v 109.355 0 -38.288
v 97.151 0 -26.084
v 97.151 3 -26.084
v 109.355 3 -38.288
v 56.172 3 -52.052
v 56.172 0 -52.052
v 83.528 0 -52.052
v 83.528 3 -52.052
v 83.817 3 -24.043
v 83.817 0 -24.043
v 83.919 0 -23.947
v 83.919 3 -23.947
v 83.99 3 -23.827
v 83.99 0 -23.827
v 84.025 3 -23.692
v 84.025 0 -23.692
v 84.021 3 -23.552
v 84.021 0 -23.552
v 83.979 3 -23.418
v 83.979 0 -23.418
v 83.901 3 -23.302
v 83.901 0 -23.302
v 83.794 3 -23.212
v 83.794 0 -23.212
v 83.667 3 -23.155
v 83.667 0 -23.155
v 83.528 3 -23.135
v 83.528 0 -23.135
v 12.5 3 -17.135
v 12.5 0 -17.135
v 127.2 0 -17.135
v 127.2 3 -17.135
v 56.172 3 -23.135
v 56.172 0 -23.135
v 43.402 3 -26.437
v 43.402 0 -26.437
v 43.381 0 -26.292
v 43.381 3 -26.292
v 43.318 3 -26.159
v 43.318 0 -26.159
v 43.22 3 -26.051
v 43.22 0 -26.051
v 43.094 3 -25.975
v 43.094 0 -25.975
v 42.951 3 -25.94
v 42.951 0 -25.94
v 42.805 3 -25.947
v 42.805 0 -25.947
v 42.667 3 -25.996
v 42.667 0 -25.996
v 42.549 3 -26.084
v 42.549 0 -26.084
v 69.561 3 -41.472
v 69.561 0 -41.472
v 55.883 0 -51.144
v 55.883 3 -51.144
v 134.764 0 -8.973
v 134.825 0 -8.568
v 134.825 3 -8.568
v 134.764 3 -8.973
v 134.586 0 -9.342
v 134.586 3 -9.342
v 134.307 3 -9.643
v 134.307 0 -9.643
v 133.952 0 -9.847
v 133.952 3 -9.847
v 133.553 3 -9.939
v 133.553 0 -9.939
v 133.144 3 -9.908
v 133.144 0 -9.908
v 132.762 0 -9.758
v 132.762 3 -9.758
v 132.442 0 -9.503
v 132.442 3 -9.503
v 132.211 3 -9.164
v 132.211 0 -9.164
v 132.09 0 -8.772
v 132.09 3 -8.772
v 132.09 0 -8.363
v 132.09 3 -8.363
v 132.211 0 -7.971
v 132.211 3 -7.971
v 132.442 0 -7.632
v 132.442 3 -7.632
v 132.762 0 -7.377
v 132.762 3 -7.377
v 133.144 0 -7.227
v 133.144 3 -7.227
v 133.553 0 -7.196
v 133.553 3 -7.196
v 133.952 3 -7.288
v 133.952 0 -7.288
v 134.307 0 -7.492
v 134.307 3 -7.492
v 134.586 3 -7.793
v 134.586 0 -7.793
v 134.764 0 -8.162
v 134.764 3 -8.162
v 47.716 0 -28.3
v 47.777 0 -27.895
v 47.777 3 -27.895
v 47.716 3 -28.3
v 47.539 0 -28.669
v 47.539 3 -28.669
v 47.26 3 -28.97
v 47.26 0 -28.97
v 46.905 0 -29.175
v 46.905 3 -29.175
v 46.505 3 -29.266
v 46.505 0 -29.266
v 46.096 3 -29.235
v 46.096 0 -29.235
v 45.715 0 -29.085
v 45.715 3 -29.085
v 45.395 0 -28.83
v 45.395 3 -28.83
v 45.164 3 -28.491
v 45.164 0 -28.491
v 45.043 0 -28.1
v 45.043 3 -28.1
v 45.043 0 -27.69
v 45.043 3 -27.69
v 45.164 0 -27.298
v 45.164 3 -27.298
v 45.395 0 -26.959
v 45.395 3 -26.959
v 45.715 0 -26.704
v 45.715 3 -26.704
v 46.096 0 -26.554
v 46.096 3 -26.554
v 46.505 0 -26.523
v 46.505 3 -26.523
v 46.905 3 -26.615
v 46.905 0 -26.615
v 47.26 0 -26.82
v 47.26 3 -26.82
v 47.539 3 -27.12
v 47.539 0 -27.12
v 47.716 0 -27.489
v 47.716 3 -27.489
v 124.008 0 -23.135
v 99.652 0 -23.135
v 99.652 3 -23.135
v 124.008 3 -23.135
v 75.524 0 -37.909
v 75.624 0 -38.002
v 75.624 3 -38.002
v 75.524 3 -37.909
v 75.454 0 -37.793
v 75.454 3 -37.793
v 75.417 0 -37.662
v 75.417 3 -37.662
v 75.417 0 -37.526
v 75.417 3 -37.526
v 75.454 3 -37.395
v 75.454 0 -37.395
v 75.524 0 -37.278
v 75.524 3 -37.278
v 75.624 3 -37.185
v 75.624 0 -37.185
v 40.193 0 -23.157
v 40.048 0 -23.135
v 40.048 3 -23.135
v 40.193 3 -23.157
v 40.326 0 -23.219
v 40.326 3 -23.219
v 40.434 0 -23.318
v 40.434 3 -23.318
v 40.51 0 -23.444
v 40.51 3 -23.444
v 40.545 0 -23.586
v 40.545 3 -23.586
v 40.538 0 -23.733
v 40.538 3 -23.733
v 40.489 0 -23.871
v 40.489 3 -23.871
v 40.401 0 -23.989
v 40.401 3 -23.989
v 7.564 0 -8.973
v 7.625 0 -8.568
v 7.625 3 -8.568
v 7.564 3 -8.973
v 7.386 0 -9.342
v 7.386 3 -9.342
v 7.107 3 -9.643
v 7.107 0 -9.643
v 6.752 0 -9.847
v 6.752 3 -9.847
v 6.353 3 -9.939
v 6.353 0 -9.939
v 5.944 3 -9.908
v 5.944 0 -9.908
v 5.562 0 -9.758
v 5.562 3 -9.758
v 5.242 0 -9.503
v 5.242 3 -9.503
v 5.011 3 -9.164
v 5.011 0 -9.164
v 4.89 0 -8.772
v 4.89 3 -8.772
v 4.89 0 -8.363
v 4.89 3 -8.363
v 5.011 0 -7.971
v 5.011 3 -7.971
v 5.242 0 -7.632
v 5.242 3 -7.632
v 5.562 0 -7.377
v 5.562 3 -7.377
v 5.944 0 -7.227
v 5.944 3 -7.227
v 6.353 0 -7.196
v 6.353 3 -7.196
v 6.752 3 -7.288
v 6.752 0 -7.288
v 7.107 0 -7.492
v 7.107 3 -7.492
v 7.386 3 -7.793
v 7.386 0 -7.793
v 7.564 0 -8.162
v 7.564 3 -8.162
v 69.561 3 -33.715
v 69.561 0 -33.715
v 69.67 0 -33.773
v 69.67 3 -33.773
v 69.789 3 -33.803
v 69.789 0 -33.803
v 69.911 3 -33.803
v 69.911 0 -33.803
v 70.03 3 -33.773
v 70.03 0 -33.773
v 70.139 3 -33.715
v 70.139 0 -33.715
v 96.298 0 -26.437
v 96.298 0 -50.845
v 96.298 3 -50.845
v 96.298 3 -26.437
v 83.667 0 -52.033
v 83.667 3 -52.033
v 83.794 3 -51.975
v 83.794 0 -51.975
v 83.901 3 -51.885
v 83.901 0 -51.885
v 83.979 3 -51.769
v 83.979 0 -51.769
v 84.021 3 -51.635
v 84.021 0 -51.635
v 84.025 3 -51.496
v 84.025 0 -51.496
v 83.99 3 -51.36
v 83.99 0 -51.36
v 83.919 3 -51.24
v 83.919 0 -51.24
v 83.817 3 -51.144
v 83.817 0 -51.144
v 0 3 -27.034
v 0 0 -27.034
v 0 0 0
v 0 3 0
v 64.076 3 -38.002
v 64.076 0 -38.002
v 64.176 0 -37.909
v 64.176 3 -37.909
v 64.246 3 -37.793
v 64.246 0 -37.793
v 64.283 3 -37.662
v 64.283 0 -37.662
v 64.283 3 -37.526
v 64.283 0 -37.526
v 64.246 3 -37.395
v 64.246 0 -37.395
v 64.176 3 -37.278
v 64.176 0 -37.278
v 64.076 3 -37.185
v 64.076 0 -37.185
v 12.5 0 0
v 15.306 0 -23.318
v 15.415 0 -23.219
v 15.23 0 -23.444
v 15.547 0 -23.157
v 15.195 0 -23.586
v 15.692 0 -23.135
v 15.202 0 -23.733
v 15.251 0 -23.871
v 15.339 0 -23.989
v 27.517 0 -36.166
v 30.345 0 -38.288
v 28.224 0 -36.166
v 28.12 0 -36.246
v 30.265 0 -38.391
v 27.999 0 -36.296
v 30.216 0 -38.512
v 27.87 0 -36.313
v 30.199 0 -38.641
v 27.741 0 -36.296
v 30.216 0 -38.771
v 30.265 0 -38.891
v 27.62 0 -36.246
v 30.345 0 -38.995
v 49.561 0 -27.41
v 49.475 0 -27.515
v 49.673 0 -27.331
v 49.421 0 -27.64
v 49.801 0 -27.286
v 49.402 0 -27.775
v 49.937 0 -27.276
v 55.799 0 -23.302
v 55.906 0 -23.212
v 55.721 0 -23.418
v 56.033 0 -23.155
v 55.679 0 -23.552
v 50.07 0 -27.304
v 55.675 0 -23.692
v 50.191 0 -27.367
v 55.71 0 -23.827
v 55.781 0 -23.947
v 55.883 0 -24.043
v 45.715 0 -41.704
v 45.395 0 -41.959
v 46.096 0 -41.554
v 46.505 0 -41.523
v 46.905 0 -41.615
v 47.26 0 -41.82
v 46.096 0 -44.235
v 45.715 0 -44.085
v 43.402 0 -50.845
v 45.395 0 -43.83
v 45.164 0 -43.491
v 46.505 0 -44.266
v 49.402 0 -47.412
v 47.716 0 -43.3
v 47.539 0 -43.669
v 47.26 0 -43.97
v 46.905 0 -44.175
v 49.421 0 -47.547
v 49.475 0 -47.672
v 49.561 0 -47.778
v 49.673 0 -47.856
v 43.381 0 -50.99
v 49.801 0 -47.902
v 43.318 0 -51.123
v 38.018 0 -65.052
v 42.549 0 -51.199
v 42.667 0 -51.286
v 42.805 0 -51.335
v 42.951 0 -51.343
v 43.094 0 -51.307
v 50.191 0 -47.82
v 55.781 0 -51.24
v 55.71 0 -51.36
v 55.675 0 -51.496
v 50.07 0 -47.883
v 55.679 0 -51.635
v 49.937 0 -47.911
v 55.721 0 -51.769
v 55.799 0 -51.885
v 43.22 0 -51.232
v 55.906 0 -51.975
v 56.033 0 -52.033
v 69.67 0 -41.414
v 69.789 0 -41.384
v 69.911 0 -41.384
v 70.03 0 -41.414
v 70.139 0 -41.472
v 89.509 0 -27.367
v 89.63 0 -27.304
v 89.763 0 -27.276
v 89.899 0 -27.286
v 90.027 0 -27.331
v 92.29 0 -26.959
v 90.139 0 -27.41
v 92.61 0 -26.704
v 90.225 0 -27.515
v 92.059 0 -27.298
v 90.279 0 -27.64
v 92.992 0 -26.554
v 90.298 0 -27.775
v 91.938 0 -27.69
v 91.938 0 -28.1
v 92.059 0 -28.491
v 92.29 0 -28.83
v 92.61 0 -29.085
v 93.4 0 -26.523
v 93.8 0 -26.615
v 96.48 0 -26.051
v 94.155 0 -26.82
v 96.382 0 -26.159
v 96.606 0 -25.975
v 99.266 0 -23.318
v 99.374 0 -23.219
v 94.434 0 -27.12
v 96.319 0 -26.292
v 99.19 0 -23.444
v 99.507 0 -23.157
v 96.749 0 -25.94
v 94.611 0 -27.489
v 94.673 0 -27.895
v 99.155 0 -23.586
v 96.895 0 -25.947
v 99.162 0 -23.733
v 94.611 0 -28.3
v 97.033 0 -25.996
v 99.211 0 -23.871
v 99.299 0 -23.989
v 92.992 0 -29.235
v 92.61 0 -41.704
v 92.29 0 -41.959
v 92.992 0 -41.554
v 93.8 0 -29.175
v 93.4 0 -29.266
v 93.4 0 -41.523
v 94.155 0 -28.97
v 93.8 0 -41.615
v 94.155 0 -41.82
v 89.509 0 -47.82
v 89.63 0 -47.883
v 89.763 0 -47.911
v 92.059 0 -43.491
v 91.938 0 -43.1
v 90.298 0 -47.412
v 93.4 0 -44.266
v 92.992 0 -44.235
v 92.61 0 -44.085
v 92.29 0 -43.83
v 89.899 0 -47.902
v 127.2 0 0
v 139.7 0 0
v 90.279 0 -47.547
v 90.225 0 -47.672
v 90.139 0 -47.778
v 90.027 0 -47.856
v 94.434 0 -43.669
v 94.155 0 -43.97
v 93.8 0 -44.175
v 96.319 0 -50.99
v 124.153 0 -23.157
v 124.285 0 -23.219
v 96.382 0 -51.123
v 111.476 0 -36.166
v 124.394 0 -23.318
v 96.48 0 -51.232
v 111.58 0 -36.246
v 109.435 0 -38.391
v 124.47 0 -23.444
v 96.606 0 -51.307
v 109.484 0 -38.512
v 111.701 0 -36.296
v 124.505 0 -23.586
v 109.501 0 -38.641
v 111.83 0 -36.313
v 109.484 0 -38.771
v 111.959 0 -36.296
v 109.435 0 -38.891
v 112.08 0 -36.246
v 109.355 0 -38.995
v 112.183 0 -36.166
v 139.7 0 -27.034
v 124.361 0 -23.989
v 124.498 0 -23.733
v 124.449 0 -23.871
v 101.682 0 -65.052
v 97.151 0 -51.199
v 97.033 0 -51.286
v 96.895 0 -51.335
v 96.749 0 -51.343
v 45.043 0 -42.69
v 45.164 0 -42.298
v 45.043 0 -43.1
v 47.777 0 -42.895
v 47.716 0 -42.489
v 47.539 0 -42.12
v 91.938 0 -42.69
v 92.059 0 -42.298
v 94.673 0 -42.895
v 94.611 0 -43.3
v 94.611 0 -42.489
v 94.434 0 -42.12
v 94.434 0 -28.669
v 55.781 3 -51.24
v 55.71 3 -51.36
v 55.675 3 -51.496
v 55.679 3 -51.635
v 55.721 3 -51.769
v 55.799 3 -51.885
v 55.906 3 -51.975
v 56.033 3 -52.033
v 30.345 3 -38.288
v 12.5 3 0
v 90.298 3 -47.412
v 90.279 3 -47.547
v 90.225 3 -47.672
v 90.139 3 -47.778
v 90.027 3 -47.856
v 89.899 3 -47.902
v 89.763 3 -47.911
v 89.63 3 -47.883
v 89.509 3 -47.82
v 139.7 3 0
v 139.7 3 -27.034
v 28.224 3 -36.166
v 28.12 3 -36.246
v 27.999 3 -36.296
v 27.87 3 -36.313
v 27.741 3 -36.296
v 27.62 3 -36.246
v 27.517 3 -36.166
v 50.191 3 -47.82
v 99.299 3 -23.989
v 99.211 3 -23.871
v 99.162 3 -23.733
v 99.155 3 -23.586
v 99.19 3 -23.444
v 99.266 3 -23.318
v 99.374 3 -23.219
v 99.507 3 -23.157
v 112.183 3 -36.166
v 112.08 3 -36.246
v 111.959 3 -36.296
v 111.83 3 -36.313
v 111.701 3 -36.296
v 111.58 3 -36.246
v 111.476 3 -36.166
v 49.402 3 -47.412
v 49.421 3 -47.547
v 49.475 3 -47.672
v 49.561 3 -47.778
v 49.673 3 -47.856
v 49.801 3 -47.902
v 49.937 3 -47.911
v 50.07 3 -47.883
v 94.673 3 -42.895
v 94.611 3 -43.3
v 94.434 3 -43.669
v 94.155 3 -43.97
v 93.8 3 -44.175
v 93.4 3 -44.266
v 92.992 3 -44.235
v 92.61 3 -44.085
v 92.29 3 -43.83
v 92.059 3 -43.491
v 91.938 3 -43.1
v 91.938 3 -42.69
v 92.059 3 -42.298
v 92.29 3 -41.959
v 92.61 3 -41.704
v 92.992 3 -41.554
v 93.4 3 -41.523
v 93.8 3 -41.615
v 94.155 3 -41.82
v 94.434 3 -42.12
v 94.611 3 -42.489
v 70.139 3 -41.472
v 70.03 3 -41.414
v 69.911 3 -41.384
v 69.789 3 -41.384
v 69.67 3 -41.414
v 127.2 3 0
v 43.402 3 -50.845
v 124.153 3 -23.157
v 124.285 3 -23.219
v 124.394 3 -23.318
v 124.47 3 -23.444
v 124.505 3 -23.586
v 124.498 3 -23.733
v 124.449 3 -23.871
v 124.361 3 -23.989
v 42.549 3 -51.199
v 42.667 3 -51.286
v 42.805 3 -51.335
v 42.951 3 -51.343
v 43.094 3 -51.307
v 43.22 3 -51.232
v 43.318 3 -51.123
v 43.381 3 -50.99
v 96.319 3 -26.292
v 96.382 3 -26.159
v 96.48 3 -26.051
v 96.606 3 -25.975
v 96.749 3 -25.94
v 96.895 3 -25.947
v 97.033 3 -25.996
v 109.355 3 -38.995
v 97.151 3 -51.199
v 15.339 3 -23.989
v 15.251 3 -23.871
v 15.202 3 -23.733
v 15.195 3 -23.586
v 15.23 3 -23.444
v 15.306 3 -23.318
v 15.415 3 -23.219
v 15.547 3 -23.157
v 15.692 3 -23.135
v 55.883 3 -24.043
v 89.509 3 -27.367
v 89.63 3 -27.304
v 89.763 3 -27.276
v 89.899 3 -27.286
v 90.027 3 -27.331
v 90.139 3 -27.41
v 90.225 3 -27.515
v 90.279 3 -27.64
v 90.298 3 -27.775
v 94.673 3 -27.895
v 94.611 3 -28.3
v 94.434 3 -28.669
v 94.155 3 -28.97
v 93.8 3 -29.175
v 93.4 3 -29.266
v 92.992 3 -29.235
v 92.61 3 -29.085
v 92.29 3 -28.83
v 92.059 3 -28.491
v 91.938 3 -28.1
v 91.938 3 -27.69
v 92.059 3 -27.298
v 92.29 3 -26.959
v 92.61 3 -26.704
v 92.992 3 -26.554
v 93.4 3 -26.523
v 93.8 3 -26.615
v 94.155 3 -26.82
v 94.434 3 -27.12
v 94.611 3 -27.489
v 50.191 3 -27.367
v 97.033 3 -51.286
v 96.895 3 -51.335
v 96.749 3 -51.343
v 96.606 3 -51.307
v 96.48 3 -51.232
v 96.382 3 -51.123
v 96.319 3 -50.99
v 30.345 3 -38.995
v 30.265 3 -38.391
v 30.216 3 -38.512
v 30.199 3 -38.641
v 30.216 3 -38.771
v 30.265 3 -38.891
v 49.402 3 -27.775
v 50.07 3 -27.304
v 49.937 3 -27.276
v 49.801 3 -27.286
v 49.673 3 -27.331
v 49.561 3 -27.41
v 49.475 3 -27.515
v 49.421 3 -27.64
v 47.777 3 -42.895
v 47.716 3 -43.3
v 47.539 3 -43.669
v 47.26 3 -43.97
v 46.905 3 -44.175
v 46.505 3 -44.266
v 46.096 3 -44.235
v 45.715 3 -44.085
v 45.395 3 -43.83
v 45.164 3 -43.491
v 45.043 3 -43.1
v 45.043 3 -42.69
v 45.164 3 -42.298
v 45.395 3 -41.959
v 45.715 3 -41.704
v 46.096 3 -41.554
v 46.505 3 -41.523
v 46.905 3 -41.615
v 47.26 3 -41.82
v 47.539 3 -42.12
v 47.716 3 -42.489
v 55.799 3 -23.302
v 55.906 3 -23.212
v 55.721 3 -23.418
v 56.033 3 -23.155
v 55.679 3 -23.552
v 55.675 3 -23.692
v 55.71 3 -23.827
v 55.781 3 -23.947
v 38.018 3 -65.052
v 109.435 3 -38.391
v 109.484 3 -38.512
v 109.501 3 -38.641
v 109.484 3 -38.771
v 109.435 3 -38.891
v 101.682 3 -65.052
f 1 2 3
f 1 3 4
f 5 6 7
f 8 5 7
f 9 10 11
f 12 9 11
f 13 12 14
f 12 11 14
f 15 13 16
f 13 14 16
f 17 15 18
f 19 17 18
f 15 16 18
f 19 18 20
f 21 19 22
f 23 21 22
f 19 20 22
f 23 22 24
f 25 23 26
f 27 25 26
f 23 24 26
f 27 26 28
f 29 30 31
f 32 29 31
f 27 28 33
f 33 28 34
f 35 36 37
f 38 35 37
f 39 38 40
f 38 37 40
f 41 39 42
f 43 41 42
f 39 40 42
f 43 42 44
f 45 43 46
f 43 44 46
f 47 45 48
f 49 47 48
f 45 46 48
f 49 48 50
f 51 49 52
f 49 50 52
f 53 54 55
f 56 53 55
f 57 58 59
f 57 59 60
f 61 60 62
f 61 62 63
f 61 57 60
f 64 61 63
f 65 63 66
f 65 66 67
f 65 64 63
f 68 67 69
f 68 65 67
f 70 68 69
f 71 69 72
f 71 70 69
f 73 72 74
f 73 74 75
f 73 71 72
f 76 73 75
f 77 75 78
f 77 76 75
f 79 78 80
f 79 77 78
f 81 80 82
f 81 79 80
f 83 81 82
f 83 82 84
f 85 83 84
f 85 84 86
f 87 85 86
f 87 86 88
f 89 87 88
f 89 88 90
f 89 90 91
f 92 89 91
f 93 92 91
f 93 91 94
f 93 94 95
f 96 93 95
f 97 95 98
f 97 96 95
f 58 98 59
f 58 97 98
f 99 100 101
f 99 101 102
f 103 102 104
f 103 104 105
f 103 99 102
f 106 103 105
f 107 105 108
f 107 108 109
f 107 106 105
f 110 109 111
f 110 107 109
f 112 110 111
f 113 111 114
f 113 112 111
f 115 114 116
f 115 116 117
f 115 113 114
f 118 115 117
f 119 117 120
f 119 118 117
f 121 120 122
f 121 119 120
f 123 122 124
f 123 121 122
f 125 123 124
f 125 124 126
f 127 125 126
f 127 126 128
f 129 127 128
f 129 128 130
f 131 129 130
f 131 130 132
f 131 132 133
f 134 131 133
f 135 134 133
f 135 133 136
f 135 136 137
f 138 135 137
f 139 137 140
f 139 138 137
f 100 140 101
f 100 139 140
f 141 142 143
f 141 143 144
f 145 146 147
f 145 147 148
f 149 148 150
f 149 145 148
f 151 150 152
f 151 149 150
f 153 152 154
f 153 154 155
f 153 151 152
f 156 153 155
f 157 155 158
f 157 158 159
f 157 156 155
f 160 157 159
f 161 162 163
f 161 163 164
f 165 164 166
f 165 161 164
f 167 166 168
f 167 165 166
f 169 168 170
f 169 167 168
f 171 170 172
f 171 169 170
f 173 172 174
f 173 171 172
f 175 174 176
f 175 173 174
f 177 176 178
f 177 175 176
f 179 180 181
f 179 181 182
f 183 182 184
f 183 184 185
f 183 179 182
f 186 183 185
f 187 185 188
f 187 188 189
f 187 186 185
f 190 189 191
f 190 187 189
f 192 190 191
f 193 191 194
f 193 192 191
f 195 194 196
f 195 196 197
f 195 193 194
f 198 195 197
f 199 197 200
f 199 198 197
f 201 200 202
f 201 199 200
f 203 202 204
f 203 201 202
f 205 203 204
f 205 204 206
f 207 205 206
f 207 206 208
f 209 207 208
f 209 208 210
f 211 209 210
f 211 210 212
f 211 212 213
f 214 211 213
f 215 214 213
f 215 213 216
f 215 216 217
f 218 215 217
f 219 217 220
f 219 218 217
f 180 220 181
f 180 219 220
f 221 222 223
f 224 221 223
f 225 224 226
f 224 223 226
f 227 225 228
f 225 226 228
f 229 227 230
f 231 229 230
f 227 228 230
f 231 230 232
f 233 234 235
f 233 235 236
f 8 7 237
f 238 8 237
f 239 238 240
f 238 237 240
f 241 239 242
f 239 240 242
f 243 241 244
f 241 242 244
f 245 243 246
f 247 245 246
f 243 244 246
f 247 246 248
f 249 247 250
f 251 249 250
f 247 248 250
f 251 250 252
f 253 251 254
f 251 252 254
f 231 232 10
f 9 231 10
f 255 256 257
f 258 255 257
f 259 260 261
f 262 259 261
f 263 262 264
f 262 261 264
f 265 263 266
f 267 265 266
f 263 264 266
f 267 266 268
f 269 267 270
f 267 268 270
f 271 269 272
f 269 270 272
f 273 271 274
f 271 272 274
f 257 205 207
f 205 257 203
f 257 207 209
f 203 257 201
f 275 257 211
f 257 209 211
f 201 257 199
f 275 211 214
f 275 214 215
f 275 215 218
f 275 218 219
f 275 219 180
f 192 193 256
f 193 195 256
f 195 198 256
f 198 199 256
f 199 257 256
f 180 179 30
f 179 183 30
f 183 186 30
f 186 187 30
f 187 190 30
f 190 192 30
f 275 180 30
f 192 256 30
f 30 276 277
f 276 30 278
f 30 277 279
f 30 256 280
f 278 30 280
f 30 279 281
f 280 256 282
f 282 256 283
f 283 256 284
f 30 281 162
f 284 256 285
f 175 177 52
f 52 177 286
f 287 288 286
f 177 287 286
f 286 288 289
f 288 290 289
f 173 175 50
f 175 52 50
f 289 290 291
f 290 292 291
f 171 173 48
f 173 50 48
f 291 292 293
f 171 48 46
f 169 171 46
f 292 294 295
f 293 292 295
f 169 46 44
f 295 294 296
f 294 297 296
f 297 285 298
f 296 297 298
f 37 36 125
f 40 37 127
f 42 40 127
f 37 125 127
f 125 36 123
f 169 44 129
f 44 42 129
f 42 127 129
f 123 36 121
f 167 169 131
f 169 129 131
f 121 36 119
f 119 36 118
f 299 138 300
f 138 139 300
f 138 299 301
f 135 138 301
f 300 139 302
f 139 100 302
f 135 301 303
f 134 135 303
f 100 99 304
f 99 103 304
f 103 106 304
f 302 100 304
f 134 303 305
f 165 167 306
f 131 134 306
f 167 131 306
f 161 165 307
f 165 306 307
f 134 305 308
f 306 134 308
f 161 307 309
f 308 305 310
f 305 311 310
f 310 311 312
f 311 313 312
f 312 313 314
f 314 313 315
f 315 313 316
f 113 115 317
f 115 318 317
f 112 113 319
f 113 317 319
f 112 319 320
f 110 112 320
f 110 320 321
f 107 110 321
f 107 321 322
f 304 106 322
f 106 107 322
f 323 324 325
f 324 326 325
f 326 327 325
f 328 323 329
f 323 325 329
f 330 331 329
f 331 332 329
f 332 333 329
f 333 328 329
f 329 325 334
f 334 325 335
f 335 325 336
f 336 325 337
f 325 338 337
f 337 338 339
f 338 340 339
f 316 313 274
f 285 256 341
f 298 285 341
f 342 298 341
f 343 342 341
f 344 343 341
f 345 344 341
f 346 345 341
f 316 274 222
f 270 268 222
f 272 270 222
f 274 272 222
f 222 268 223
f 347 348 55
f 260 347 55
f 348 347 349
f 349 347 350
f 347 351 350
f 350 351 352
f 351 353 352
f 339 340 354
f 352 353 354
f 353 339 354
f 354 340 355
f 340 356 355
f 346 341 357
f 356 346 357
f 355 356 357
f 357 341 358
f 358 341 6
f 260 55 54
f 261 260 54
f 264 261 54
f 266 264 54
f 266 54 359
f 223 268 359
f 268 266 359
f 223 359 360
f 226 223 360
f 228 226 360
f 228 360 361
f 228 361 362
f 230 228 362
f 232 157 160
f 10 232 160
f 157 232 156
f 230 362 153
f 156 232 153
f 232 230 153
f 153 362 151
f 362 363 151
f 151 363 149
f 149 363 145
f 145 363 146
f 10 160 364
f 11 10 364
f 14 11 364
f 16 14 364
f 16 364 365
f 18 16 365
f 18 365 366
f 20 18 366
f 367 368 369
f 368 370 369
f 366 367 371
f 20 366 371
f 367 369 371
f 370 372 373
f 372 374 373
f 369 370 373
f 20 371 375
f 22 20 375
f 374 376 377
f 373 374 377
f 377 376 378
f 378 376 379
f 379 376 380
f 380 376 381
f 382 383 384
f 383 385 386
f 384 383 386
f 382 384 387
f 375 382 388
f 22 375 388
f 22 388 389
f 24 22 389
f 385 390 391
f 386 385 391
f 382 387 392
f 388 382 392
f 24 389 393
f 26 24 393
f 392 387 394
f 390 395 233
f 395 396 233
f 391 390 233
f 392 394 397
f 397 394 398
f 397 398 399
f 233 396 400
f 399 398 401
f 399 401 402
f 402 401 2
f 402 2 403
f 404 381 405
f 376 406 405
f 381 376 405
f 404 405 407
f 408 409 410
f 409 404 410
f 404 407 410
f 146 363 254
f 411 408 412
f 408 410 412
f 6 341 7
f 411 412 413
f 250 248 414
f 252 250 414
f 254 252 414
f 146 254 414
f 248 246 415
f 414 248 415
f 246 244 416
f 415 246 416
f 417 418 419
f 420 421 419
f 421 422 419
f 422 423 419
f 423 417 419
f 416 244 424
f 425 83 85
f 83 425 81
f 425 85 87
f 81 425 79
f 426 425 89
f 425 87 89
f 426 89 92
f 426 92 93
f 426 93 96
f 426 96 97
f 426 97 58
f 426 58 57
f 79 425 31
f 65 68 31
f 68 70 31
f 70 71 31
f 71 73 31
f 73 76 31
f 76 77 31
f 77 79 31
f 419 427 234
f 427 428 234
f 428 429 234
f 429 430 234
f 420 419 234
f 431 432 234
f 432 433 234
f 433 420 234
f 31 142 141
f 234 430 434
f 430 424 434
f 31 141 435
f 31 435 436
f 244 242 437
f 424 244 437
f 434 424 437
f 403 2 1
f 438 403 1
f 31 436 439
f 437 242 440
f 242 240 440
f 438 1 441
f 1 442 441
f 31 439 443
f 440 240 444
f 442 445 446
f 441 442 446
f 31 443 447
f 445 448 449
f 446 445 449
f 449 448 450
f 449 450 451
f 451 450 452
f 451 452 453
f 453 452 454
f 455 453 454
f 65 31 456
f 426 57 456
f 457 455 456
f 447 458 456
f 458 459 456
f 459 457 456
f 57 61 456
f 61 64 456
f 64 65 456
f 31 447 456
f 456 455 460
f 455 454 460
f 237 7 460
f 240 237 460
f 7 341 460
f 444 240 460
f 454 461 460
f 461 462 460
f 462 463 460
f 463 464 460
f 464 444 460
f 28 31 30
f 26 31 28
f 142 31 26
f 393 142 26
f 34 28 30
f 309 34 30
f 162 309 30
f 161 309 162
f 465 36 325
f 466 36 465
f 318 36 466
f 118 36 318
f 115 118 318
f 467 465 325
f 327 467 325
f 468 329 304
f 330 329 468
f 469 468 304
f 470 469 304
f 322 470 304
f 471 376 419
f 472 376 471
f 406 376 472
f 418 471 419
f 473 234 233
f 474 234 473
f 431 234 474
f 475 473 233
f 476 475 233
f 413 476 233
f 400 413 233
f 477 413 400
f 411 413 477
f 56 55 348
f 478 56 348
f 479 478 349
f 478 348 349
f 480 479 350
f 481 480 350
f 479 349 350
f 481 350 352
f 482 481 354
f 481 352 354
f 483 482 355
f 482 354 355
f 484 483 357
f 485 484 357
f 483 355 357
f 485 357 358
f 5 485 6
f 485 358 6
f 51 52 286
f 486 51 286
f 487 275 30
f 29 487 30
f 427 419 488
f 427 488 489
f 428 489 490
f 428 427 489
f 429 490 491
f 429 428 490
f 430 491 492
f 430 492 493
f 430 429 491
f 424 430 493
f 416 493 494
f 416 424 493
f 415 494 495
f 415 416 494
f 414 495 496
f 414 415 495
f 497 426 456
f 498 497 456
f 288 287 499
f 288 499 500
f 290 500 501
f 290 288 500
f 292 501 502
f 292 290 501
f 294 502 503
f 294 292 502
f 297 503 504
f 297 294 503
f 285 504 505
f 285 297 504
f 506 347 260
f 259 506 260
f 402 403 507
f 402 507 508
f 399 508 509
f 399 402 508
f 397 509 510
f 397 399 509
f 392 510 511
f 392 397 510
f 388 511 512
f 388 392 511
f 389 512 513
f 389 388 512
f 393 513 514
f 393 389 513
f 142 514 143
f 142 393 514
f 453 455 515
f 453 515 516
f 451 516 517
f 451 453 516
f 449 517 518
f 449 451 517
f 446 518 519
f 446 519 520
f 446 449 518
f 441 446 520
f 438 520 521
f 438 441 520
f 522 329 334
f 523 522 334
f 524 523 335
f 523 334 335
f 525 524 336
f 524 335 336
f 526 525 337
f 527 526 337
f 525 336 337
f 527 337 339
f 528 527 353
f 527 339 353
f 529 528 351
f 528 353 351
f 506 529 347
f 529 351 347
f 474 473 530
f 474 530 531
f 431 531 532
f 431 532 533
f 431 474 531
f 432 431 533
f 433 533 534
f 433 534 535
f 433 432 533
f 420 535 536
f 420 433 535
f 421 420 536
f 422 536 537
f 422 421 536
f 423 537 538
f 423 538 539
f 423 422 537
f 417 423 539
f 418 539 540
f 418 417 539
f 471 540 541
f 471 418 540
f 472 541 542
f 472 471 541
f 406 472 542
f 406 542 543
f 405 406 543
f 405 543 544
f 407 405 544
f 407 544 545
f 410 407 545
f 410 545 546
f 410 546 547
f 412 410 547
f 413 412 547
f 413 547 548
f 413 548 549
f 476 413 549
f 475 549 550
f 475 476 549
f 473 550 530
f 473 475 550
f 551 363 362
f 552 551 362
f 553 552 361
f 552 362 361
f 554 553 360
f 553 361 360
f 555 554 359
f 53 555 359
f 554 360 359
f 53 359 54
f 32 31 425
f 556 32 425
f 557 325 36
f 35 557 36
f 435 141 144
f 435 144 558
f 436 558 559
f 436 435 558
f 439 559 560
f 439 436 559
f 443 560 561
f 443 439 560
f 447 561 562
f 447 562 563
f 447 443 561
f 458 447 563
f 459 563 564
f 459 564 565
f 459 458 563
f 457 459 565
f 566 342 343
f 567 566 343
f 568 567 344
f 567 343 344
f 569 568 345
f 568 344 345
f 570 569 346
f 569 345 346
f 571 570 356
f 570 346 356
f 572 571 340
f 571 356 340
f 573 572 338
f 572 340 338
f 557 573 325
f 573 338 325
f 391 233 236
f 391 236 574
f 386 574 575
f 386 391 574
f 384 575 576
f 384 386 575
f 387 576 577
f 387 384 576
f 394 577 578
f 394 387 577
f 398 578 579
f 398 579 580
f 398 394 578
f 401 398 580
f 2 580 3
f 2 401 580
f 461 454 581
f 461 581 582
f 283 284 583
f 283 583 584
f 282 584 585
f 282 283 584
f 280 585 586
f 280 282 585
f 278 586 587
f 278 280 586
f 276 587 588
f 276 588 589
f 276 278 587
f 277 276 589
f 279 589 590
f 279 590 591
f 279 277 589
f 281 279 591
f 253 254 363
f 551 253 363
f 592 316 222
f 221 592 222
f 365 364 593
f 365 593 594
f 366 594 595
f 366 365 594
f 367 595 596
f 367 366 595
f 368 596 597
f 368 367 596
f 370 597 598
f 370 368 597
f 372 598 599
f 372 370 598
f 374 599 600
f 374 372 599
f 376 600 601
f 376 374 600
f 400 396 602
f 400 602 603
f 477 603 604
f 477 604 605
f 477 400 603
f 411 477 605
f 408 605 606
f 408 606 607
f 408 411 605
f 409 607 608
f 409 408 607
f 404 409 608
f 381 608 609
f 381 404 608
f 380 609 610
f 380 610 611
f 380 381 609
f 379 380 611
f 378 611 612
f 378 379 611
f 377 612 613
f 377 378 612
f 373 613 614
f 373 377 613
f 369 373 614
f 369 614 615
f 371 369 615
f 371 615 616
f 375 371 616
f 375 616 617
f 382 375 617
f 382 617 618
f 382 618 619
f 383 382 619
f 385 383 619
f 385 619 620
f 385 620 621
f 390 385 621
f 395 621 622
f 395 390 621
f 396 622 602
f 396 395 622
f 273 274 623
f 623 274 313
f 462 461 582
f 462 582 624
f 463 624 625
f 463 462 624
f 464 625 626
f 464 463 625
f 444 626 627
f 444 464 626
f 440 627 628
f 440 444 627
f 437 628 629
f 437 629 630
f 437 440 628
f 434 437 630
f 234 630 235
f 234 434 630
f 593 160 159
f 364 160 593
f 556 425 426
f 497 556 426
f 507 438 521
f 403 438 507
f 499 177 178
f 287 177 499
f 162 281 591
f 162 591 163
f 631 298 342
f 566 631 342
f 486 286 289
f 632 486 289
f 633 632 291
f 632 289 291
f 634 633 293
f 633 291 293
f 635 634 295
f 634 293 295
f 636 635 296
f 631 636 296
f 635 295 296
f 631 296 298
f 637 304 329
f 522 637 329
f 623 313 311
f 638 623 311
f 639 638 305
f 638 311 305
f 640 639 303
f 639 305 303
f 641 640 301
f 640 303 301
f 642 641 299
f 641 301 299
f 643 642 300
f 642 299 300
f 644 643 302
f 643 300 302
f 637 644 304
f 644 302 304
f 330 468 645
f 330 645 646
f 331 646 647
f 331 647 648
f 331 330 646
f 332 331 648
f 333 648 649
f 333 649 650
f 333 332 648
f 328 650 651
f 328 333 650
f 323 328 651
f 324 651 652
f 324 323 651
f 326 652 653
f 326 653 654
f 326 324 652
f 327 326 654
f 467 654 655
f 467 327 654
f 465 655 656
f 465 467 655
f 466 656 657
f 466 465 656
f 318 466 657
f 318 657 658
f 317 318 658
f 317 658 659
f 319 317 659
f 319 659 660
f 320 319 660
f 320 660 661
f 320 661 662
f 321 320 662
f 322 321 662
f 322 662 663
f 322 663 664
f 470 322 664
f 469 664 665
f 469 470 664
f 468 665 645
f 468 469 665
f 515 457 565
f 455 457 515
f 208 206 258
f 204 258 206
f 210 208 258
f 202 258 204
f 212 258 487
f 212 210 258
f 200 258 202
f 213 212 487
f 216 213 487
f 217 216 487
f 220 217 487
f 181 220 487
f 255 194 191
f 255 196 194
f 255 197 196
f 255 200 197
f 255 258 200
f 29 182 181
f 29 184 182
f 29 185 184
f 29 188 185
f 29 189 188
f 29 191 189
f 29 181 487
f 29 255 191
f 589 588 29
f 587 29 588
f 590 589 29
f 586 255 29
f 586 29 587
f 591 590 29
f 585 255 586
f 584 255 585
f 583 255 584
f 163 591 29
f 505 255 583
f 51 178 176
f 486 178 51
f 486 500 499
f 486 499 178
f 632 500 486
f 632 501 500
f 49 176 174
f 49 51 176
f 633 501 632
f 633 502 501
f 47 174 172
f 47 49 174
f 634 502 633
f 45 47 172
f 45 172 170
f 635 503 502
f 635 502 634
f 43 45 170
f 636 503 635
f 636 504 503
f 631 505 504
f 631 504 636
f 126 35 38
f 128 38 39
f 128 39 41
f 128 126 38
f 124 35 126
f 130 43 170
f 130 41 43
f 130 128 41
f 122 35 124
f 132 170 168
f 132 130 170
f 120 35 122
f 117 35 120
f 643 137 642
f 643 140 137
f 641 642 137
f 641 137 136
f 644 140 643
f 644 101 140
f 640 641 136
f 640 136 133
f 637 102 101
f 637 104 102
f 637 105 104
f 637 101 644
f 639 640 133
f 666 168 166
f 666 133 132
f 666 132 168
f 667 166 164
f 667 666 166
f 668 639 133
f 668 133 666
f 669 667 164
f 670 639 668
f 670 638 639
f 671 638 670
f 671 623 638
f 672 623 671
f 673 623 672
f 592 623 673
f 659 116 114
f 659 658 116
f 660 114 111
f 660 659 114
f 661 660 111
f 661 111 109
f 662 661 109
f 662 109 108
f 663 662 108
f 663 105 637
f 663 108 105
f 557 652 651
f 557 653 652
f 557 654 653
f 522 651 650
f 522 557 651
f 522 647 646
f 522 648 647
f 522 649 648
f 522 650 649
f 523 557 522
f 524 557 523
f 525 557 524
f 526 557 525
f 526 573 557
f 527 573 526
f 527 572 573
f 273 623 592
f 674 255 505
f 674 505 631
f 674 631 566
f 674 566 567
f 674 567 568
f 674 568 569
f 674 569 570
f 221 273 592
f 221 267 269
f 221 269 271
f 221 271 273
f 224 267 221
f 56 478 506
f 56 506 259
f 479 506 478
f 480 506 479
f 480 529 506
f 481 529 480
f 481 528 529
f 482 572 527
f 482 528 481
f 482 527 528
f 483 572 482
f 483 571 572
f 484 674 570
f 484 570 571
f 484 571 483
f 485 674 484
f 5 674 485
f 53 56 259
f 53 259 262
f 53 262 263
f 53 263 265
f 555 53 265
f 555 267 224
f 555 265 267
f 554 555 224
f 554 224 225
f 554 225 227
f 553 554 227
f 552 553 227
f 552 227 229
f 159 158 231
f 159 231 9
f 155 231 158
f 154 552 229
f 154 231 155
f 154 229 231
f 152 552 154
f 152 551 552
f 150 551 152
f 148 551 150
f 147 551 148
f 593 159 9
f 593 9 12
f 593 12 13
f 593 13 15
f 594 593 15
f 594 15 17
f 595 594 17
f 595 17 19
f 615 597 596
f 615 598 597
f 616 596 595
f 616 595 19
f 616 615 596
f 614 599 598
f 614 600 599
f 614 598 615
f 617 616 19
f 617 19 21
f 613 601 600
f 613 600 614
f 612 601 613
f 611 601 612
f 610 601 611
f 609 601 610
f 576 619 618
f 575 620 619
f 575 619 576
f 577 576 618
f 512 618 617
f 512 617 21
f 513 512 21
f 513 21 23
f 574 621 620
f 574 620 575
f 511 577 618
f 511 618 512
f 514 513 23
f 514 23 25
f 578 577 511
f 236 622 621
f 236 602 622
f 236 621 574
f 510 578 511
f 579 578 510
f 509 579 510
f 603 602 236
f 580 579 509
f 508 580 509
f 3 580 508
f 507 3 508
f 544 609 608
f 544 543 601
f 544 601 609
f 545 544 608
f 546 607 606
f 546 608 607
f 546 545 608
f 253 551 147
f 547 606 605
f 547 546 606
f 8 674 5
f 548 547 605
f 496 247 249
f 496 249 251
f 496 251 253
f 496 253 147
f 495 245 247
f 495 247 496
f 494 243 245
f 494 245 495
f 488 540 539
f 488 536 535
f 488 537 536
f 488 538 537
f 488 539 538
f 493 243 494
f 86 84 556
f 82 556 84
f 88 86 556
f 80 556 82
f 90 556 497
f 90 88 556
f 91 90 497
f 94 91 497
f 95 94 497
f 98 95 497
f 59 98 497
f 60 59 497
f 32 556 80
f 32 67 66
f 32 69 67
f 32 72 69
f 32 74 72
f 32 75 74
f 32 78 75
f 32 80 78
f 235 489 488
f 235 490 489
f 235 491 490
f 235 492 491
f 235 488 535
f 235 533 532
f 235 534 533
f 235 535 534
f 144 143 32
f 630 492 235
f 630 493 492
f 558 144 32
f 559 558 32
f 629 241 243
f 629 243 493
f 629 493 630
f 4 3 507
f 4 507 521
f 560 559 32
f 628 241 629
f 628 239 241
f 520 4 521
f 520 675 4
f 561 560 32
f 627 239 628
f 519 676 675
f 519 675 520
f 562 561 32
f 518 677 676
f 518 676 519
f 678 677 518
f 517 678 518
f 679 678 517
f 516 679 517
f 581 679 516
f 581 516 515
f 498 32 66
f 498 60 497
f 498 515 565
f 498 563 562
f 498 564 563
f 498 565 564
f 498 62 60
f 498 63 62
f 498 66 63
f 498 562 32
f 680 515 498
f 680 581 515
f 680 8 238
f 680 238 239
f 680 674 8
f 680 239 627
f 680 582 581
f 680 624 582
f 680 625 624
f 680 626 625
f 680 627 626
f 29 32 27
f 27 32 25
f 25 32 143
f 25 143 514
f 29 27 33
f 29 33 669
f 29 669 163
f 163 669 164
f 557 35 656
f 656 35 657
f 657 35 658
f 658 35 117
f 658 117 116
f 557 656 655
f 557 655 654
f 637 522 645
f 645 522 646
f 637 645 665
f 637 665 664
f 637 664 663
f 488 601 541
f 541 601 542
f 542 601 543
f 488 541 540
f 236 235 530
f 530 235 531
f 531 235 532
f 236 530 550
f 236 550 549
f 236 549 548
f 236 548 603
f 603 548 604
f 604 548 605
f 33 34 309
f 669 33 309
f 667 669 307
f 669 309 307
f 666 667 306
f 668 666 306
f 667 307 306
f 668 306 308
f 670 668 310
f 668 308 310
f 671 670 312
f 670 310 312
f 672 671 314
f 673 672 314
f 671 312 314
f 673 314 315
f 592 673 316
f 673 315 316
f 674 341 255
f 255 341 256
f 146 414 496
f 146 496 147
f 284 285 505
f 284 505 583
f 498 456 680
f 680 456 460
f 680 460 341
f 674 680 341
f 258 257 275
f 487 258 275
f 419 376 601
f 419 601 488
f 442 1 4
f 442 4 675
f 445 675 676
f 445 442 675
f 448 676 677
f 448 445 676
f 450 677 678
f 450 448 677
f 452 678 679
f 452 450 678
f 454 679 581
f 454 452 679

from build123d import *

# Parameters (mm, degrees)
SKETCH1_R           = 1.375
BOSS_EXTRUDE1_DEPTH = 3


with BuildPart() as part:
    # Sketch1 → Boss-Extrude1 (new body)
    with BuildSketch(Plane(origin=(0, 0, 0), x_dir=(1, 0, 0), z_dir=(0, 1, 0))):
        Polygon((12.5, 17.135), (127.2, 17.135), (127.2, 0), (139.7, 0), (139.7, 17.135), (139.7, 27.03449494), (101.68231227, 65.05218267), (38.01768773, 65.05218267), (0, 27.03449494), (0, 17.135), (0, 0), (12.5, 0), align=None)
        with Locations((6.25, 8.5675)):
            Circle(SKETCH1_R, mode=Mode.SUBTRACT)
        with Locations((133.45, 8.5675)):
            Circle(SKETCH1_R, mode=Mode.SUBTRACT)
        with Locations((46.402464035, 27.89462575)):
            Circle(SKETCH1_R, mode=Mode.SUBTRACT)
        with Locations((46.402464035, 42.89462575)):
            Circle(SKETCH1_R, mode=Mode.SUBTRACT)
        with Locations((93.297535965, 27.89462575)):
            Circle(SKETCH1_R, mode=Mode.SUBTRACT)
        with Locations((93.297535965, 42.89462575)):
            Circle(SKETCH1_R, mode=Mode.SUBTRACT)
        with BuildLine():
            Line((55.883073513, 24.04324829), (69.561324865, 33.715232576))
            ThreePointArc((69.561324865, 33.715232576), (69.85, 33.806984285), (70.138675135, 33.715232576))
            Line((70.138675135, 33.715232576), (83.816926487, 24.04324829))
            ThreePointArc((83.816926487, 24.04324829), (84.004761659, 23.483547277), (83.528251352, 23.135))
            Line((83.528251352, 23.135), (56.171748648, 23.135))
            ThreePointArc((56.171748648, 23.135), (55.695238341, 23.483547277), (55.883073513, 24.04324829))
        make_face(mode=Mode.SUBTRACT)
        with BuildLine():
            Line((49.40246404, 27.77516044), (49.40246404, 47.41202223))
            ThreePointArc((49.40246404, 47.41202223), (49.672613618, 47.856059147), (50.191139175, 47.82027052))
            Line((50.191139175, 47.82027052), (64.076497308, 38.001839625))
            ThreePointArc((64.076497308, 38.001839625), (64.287822173, 37.593591335), (64.076497308, 37.185343045))
            Line((64.076497308, 37.185343045), (50.191139175, 27.36691215))
            ThreePointArc((50.191139175, 27.36691215), (49.672613618, 27.331123523), (49.40246404, 27.77516044))
        make_face(mode=Mode.SUBTRACT)
        with BuildLine():
            Line((56.171748648, 52.05218267), (83.528251352, 52.05218267))
            ThreePointArc((83.528251352, 52.05218267), (84.004761659, 51.703635393), (83.816926487, 51.14393438))
            Line((83.816926487, 51.14393438), (70.138675135, 41.471950094))
            ThreePointArc((70.138675135, 41.471950094), (69.85, 41.380198385), (69.561324865, 41.471950094))
            Line((69.561324865, 41.471950094), (55.883073513, 51.14393438))
            ThreePointArc((55.883073513, 51.14393438), (55.695238341, 51.703635393), (56.171748648, 52.05218267))
        make_face(mode=Mode.SUBTRACT)
        with BuildLine():
            Line((90.29753596, 27.77516044), (90.29753596, 47.41202223))
            ThreePointArc((90.29753596, 47.41202223), (90.027386382, 47.856059147), (89.508860825, 47.82027052))
            Line((89.508860825, 47.82027052), (75.623502692, 38.001839625))
            ThreePointArc((75.623502692, 38.001839625), (75.412177827, 37.593591335), (75.623502692, 37.185343045))
            Line((75.623502692, 37.185343045), (89.508860825, 27.36691215))
            ThreePointArc((89.508860825, 27.36691215), (90.027386382, 27.331123523), (90.29753596, 27.77516044))
        make_face(mode=Mode.SUBTRACT)
        with BuildLine():
            Line((15.692388152, 23.135), (40.04777251, 23.135))
            ThreePointArc((40.04777251, 23.135), (40.509712276, 23.443658284), (40.4013259, 23.988553391))
            Line((40.4013259, 23.988553391), (28.223633721, 36.166245569))
            ThreePointArc((28.223633721, 36.166245569), (27.870080331, 36.312692179), (27.51652694, 36.166245569))
            Line((27.51652694, 36.166245569), (15.338834761, 23.988553391))
            ThreePointArc((15.338834761, 23.988553391), (15.230448386, 23.443658284), (15.692388152, 23.135))
        make_face(mode=Mode.SUBTRACT)
        with BuildLine():
            Line((30.344954065, 38.994672694), (42.548910644, 51.198629273))
            ThreePointArc((42.548910644, 51.198629273), (43.093805751, 51.307015649), (43.402464035, 50.845075883))
            Line((43.402464035, 50.845075883), (43.402464035, 26.437162724))
            ThreePointArc((43.402464035, 26.437162724), (43.093805751, 25.975222958), (42.548910644, 26.083609334))
            Line((42.548910644, 26.083609334), (30.344954065, 38.287565913))
            ThreePointArc((30.344954065, 38.287565913), (30.198507456, 38.641119304), (30.344954065, 38.994672694))
        make_face(mode=Mode.SUBTRACT)
        with BuildLine():
            Line((109.355045935, 38.994672694), (97.151089356, 51.198629273))
            ThreePointArc((97.151089356, 51.198629273), (96.606194249, 51.307015649), (96.297535965, 50.845075883))
            Line((96.297535965, 50.845075883), (96.297535965, 26.437162724))
            ThreePointArc((96.297535965, 26.437162724), (96.606194249, 25.975222958), (97.151089356, 26.083609334))
            Line((97.151089356, 26.083609334), (109.355045935, 38.287565913))
            ThreePointArc((109.355045935, 38.287565913), (109.501492544, 38.641119304), (109.355045935, 38.994672694))
        make_face(mode=Mode.SUBTRACT)
        with BuildLine():
            Line((124.361165239, 23.988553391), (112.18347306, 36.166245569))
            ThreePointArc((112.18347306, 36.166245569), (111.829919669, 36.312692179), (111.476366279, 36.166245569))
            Line((111.476366279, 36.166245569), (99.2986741, 23.988553391))
            ThreePointArc((99.2986741, 23.988553391), (99.190287724, 23.443658284), (99.65222749, 23.135))
            Line((99.65222749, 23.135), (124.007611848, 23.135))
            ThreePointArc((124.007611848, 23.135), (124.469551614, 23.443658284), (124.361165239, 23.988553391))
        make_face(mode=Mode.SUBTRACT)
    extrude(amount=BOSS_EXTRUDE1_DEPTH)


solid = part.part
